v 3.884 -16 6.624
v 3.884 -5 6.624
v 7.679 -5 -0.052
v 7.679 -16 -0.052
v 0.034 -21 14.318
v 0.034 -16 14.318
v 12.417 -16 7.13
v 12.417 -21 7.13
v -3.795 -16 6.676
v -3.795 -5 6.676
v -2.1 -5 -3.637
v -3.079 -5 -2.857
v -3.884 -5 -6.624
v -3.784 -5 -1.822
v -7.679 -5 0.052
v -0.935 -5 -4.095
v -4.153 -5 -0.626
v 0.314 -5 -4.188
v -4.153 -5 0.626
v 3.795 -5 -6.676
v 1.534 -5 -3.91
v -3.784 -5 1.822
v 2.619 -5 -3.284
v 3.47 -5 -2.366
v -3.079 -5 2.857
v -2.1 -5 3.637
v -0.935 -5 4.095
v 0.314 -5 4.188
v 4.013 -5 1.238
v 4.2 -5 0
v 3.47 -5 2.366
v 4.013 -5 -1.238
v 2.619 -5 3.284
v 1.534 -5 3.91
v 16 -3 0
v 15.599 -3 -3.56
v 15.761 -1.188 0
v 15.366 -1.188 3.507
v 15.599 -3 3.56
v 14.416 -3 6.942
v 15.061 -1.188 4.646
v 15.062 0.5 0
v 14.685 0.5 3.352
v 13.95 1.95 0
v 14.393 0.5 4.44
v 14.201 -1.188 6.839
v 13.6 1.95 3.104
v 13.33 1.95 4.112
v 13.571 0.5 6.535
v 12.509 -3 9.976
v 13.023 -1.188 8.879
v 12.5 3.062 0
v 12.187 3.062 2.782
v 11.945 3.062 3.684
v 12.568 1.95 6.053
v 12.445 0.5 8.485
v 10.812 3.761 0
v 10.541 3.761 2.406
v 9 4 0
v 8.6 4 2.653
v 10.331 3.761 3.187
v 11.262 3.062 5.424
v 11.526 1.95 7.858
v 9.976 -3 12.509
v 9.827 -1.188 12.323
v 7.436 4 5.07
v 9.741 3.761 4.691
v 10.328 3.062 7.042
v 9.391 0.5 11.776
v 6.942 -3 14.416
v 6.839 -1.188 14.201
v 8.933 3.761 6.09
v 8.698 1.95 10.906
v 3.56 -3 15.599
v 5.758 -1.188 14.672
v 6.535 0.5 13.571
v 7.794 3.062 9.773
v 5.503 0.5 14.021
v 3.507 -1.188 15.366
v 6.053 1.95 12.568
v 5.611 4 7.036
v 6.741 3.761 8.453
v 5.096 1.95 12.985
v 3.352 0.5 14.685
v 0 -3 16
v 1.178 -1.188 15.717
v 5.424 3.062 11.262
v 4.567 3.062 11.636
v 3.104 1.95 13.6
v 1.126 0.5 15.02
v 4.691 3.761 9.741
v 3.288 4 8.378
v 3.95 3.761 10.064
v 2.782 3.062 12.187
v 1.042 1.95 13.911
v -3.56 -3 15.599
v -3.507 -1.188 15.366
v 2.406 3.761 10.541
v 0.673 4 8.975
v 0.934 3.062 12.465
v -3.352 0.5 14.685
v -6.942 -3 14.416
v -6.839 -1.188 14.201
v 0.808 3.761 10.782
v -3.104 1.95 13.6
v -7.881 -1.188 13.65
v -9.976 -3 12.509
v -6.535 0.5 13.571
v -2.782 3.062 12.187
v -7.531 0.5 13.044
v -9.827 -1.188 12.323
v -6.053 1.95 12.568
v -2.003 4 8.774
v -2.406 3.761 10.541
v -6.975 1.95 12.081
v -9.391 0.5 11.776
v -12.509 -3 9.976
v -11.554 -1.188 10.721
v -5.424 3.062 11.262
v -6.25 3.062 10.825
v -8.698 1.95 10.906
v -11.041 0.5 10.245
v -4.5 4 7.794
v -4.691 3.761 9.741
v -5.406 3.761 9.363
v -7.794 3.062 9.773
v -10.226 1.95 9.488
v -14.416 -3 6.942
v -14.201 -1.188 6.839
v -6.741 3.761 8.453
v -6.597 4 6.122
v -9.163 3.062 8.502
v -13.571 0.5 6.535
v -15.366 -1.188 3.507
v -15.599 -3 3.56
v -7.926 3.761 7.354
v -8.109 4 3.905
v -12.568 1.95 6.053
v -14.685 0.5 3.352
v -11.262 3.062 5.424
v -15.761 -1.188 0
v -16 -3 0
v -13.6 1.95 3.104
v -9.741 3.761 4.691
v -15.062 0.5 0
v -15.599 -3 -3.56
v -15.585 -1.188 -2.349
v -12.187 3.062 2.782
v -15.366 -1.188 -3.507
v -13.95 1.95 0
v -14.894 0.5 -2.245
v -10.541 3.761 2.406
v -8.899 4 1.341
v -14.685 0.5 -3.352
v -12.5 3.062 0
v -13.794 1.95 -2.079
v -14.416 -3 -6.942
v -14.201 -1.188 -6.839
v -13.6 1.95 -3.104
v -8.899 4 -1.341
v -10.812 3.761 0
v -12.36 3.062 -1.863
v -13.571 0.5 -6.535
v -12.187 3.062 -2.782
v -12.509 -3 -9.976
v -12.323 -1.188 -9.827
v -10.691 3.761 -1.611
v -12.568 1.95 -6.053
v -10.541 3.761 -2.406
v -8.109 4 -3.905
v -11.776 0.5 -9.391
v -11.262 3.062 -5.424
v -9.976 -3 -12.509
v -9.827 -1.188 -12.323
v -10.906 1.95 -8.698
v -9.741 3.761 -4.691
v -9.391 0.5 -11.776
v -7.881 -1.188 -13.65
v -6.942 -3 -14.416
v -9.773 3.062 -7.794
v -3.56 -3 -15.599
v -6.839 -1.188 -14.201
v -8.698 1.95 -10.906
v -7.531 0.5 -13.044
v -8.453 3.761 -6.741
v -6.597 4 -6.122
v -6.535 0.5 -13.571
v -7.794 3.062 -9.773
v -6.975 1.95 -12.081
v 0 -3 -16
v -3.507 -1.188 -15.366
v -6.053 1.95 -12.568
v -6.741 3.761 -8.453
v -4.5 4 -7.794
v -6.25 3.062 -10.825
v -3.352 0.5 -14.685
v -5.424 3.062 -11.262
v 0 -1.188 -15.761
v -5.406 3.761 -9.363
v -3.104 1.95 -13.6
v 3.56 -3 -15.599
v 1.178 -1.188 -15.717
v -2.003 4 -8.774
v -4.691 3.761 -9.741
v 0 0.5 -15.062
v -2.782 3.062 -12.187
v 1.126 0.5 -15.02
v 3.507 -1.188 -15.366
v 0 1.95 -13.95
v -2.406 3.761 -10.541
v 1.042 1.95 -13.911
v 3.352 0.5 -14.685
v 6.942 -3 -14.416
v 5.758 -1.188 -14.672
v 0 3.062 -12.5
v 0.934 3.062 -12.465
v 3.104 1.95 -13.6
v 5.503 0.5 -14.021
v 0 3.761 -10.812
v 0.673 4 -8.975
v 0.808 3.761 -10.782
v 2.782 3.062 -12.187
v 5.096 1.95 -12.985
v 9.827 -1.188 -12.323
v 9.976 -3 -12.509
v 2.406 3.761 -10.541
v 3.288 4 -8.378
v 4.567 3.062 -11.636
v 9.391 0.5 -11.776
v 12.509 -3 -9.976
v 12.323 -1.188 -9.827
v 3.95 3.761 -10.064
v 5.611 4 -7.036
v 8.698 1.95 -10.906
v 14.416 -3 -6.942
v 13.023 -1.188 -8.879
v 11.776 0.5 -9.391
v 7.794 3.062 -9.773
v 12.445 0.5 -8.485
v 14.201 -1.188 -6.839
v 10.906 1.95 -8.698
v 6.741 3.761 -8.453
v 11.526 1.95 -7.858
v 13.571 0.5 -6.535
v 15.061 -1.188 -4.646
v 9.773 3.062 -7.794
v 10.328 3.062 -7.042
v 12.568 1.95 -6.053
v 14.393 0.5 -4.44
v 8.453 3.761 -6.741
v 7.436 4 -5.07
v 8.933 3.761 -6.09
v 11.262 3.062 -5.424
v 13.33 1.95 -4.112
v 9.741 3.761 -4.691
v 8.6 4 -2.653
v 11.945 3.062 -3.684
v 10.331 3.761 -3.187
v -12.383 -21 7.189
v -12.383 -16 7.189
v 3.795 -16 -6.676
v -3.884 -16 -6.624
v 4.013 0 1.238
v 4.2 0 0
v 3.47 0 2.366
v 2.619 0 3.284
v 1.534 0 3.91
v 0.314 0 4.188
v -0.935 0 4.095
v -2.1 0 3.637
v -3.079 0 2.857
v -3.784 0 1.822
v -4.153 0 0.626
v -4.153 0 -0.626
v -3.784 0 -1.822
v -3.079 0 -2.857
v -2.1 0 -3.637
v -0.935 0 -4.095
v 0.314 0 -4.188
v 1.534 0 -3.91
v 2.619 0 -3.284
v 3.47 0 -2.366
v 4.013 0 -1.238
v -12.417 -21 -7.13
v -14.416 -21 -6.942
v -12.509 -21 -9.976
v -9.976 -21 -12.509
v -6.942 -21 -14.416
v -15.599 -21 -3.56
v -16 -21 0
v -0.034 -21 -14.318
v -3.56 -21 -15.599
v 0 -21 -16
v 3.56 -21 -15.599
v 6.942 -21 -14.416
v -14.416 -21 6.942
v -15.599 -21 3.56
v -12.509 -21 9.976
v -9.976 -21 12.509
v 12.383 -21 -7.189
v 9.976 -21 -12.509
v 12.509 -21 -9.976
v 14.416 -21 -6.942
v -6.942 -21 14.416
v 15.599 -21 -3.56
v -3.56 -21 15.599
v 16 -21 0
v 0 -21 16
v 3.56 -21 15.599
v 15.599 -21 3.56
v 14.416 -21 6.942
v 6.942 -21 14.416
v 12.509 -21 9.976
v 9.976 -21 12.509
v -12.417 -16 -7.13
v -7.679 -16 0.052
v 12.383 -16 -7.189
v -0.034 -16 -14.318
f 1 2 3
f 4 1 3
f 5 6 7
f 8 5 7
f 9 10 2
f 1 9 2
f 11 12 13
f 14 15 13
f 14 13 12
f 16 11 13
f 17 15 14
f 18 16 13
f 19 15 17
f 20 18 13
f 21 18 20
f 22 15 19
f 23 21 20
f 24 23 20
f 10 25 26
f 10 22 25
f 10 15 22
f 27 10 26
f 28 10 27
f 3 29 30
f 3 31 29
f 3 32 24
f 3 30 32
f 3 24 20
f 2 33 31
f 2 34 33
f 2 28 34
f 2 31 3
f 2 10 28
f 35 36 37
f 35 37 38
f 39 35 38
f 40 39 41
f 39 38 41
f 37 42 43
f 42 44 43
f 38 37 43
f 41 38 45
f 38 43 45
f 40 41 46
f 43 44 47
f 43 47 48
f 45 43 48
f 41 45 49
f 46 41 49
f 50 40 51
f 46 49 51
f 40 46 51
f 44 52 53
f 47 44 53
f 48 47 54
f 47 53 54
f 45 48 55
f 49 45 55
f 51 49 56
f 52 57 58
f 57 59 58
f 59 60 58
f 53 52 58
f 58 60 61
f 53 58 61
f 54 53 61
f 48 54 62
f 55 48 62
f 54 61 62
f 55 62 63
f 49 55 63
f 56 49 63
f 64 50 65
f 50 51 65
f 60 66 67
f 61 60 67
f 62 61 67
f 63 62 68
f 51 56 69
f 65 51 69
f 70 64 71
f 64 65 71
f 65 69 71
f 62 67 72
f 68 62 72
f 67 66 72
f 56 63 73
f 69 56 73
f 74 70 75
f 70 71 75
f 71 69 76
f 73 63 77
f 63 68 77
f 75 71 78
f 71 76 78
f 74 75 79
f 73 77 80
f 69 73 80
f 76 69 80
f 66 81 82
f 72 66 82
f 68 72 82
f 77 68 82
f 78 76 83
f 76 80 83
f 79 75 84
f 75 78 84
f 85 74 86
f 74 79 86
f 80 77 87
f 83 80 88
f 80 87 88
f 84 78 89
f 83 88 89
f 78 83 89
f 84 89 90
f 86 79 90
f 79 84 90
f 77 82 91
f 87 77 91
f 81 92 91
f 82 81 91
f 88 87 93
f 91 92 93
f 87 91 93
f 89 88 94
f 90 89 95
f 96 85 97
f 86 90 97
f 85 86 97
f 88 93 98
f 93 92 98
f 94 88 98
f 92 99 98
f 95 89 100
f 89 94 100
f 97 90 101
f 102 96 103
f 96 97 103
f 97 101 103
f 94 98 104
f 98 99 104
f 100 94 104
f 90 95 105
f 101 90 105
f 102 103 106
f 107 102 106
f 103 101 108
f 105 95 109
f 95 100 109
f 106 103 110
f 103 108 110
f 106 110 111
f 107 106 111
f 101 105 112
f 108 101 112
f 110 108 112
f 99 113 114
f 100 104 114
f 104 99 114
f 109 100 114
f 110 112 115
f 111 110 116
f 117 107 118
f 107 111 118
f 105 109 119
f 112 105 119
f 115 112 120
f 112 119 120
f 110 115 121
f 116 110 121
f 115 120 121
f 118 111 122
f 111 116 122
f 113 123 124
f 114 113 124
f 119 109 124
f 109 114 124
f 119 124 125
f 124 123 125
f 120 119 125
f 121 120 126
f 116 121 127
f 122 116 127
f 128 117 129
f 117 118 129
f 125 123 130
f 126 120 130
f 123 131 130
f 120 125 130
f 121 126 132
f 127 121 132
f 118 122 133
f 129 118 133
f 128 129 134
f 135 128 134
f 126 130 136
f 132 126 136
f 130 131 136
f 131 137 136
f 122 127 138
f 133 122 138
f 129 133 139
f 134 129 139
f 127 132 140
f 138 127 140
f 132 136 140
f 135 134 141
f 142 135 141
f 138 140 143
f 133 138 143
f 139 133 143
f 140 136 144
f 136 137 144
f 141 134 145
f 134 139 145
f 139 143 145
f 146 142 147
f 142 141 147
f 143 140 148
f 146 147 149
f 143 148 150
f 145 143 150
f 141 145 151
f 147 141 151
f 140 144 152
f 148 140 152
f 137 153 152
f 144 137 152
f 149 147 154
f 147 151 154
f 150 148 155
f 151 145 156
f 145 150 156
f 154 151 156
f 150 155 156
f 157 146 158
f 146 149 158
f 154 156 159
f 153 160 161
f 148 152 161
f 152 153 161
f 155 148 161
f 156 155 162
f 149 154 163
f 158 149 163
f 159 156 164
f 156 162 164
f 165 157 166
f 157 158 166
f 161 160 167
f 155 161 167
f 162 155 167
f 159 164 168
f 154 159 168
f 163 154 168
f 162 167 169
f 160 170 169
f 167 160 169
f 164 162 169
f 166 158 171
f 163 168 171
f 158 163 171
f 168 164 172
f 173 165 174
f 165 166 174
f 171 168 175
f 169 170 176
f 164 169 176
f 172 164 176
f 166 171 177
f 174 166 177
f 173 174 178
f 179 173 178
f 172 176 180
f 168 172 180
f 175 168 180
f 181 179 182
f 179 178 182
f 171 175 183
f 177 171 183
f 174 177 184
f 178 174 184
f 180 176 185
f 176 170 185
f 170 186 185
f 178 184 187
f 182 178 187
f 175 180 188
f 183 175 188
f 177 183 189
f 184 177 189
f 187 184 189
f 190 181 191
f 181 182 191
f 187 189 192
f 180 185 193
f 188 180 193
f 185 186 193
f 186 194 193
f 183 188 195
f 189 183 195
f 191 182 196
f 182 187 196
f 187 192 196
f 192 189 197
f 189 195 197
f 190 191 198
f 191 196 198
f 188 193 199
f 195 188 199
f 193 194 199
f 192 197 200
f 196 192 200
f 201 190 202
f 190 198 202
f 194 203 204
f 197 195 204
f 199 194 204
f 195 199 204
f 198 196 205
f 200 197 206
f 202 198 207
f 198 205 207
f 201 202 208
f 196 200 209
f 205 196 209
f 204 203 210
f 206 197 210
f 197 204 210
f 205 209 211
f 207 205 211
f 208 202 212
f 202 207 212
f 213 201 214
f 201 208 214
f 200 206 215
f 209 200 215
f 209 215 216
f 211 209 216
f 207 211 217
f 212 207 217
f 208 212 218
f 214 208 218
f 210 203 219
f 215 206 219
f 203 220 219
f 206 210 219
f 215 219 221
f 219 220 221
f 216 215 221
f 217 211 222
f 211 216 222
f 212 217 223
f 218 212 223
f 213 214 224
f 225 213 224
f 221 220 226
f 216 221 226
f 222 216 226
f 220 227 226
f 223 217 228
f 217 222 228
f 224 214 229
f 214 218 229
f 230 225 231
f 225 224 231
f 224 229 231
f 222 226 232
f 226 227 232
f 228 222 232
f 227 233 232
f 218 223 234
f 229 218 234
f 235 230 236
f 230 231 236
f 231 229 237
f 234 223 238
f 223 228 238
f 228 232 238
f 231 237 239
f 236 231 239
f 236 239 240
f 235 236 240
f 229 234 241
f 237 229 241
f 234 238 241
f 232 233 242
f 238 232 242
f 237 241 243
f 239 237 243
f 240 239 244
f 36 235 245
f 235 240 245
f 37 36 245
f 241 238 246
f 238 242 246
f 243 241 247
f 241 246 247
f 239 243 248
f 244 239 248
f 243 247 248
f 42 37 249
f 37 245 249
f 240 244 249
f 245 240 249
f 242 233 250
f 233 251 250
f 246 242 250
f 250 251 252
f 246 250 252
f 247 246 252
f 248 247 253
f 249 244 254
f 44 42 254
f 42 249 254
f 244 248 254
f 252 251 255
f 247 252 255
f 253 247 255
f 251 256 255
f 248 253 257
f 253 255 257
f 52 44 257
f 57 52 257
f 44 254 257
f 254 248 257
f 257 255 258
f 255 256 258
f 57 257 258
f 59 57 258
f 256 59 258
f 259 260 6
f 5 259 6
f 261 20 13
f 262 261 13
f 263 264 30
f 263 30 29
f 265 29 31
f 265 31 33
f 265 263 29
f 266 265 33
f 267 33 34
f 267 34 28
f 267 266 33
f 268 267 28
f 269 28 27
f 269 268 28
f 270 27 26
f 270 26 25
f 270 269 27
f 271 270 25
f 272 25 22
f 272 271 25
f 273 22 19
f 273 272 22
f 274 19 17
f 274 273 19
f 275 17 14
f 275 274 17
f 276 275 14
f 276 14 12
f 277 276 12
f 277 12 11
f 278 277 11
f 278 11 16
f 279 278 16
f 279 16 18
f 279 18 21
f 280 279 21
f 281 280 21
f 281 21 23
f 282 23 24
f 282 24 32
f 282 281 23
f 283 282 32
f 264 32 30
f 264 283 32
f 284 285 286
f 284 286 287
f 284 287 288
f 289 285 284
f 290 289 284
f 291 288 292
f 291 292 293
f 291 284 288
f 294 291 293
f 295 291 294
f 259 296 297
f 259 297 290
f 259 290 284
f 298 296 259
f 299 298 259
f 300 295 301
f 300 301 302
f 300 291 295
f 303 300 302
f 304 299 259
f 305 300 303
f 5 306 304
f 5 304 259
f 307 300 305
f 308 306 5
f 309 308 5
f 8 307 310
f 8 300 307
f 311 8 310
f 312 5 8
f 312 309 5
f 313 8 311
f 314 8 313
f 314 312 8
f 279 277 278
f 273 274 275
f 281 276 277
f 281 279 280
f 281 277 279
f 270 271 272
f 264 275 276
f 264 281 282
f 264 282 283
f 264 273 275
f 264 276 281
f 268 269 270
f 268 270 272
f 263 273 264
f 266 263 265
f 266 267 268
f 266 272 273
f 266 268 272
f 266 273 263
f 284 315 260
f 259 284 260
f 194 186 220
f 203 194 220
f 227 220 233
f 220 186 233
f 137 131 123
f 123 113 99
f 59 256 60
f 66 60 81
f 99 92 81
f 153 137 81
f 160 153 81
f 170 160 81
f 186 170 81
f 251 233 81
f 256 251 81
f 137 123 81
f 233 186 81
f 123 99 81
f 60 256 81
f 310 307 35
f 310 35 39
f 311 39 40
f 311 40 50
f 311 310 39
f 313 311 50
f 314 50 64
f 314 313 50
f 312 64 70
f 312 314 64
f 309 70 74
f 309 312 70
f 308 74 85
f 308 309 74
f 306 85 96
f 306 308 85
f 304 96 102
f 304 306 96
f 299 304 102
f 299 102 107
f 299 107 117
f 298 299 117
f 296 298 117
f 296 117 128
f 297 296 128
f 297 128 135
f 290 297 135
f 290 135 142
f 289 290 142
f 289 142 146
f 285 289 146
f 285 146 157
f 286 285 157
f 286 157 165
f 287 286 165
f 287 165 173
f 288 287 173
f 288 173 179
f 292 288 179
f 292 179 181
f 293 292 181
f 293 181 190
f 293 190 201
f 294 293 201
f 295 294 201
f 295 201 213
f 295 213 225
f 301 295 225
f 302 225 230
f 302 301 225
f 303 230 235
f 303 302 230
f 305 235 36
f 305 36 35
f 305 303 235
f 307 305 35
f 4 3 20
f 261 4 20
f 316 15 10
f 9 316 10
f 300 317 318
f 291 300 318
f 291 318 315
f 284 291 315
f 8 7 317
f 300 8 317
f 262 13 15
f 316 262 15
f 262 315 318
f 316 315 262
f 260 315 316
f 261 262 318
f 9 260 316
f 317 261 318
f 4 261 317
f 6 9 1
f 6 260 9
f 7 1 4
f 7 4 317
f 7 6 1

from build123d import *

# Parameters (mm, degrees)
F0_R     = 16
F1_DEPTH = 21
F0_R_2   = 9
F2_DEPTH = 16
F3_R     = 16
F4_DEPTH = 4
F5_DEPTH = 16
F6_R     = 7
F0_R_3   = 4.2
F7_DEPTH = 5


with BuildPart() as f1:
    # F0 (on Front) → F1 (new body)
    with BuildSketch(Plane.XZ):
        Circle(F0_R)
        Polygon((-12.417059955, -7.1295129852), (-12.3828693393, 7.1887328687), (0.0341906157, 14.318245854), (12.417059955, 7.1295129852), (12.3828693393, -7.1887328687), (-0.0341906157, -14.318245854), align=None, mode=Mode.SUBTRACT)
    extrude(amount=F1_DEPTH)



with BuildPart() as f2:
    # F0 (on Front) → F2 (new body)
    with BuildSketch(Plane.XZ):
        Circle(F0_R_2)
        Polygon((-3.8840263382, -6.6240223986), (-7.6785848415, 0.0516542785), (-3.7945585034, 6.6756766771), (3.8840263382, 6.6240223986), (7.6785848415, -0.0516542785), (3.7945585034, -6.6756766771), align=None, mode=Mode.SUBTRACT)
    extrude(amount=F2_DEPTH)


with BuildPart() as f1_1:
    add(f1.part)

    add(f2.part)  # F4 merges F2
    # F3 (on Front) → F4 (join)
    with BuildSketch(Plane.XZ):
        Circle(F3_R)
    extrude(amount=-F4_DEPTH)

    # F0 (on Front) → F5 (join)
    with BuildSketch(Plane.XZ):
        Polygon((0.0341906157, 14.318245854), (-12.3828693393, 7.1887328687), (-12.417059955, -7.1295129852), (-0.0341906157, -14.318245854), (12.3828693393, -7.1887328687), (12.417059955, 7.1295129852), align=None)
        Circle(F0_R_2, mode=Mode.SUBTRACT)
    extrude(amount=F5_DEPTH)

    # F6
    f6_edges = [f1_1.edges().sort_by_distance(p)[0] for p in [
        (-16, 4, 0),
    ]]
    fillet(f6_edges, radius=F6_R)

    # F0 (on Front) → F7 (join)
    with BuildSketch(Plane.XZ):
        Polygon((-3.7945585034, 6.6756766771), (-7.6785848415, 0.0516542785), (-3.8840263382, -6.6240223986), (3.7945585034, -6.6756766771), (7.6785848415, -0.0516542785), (3.8840263382, 6.6240223986), align=None)
        Circle(F0_R_3, mode=Mode.SUBTRACT)
    extrude(amount=F7_DEPTH)


solid = f1_1.part
